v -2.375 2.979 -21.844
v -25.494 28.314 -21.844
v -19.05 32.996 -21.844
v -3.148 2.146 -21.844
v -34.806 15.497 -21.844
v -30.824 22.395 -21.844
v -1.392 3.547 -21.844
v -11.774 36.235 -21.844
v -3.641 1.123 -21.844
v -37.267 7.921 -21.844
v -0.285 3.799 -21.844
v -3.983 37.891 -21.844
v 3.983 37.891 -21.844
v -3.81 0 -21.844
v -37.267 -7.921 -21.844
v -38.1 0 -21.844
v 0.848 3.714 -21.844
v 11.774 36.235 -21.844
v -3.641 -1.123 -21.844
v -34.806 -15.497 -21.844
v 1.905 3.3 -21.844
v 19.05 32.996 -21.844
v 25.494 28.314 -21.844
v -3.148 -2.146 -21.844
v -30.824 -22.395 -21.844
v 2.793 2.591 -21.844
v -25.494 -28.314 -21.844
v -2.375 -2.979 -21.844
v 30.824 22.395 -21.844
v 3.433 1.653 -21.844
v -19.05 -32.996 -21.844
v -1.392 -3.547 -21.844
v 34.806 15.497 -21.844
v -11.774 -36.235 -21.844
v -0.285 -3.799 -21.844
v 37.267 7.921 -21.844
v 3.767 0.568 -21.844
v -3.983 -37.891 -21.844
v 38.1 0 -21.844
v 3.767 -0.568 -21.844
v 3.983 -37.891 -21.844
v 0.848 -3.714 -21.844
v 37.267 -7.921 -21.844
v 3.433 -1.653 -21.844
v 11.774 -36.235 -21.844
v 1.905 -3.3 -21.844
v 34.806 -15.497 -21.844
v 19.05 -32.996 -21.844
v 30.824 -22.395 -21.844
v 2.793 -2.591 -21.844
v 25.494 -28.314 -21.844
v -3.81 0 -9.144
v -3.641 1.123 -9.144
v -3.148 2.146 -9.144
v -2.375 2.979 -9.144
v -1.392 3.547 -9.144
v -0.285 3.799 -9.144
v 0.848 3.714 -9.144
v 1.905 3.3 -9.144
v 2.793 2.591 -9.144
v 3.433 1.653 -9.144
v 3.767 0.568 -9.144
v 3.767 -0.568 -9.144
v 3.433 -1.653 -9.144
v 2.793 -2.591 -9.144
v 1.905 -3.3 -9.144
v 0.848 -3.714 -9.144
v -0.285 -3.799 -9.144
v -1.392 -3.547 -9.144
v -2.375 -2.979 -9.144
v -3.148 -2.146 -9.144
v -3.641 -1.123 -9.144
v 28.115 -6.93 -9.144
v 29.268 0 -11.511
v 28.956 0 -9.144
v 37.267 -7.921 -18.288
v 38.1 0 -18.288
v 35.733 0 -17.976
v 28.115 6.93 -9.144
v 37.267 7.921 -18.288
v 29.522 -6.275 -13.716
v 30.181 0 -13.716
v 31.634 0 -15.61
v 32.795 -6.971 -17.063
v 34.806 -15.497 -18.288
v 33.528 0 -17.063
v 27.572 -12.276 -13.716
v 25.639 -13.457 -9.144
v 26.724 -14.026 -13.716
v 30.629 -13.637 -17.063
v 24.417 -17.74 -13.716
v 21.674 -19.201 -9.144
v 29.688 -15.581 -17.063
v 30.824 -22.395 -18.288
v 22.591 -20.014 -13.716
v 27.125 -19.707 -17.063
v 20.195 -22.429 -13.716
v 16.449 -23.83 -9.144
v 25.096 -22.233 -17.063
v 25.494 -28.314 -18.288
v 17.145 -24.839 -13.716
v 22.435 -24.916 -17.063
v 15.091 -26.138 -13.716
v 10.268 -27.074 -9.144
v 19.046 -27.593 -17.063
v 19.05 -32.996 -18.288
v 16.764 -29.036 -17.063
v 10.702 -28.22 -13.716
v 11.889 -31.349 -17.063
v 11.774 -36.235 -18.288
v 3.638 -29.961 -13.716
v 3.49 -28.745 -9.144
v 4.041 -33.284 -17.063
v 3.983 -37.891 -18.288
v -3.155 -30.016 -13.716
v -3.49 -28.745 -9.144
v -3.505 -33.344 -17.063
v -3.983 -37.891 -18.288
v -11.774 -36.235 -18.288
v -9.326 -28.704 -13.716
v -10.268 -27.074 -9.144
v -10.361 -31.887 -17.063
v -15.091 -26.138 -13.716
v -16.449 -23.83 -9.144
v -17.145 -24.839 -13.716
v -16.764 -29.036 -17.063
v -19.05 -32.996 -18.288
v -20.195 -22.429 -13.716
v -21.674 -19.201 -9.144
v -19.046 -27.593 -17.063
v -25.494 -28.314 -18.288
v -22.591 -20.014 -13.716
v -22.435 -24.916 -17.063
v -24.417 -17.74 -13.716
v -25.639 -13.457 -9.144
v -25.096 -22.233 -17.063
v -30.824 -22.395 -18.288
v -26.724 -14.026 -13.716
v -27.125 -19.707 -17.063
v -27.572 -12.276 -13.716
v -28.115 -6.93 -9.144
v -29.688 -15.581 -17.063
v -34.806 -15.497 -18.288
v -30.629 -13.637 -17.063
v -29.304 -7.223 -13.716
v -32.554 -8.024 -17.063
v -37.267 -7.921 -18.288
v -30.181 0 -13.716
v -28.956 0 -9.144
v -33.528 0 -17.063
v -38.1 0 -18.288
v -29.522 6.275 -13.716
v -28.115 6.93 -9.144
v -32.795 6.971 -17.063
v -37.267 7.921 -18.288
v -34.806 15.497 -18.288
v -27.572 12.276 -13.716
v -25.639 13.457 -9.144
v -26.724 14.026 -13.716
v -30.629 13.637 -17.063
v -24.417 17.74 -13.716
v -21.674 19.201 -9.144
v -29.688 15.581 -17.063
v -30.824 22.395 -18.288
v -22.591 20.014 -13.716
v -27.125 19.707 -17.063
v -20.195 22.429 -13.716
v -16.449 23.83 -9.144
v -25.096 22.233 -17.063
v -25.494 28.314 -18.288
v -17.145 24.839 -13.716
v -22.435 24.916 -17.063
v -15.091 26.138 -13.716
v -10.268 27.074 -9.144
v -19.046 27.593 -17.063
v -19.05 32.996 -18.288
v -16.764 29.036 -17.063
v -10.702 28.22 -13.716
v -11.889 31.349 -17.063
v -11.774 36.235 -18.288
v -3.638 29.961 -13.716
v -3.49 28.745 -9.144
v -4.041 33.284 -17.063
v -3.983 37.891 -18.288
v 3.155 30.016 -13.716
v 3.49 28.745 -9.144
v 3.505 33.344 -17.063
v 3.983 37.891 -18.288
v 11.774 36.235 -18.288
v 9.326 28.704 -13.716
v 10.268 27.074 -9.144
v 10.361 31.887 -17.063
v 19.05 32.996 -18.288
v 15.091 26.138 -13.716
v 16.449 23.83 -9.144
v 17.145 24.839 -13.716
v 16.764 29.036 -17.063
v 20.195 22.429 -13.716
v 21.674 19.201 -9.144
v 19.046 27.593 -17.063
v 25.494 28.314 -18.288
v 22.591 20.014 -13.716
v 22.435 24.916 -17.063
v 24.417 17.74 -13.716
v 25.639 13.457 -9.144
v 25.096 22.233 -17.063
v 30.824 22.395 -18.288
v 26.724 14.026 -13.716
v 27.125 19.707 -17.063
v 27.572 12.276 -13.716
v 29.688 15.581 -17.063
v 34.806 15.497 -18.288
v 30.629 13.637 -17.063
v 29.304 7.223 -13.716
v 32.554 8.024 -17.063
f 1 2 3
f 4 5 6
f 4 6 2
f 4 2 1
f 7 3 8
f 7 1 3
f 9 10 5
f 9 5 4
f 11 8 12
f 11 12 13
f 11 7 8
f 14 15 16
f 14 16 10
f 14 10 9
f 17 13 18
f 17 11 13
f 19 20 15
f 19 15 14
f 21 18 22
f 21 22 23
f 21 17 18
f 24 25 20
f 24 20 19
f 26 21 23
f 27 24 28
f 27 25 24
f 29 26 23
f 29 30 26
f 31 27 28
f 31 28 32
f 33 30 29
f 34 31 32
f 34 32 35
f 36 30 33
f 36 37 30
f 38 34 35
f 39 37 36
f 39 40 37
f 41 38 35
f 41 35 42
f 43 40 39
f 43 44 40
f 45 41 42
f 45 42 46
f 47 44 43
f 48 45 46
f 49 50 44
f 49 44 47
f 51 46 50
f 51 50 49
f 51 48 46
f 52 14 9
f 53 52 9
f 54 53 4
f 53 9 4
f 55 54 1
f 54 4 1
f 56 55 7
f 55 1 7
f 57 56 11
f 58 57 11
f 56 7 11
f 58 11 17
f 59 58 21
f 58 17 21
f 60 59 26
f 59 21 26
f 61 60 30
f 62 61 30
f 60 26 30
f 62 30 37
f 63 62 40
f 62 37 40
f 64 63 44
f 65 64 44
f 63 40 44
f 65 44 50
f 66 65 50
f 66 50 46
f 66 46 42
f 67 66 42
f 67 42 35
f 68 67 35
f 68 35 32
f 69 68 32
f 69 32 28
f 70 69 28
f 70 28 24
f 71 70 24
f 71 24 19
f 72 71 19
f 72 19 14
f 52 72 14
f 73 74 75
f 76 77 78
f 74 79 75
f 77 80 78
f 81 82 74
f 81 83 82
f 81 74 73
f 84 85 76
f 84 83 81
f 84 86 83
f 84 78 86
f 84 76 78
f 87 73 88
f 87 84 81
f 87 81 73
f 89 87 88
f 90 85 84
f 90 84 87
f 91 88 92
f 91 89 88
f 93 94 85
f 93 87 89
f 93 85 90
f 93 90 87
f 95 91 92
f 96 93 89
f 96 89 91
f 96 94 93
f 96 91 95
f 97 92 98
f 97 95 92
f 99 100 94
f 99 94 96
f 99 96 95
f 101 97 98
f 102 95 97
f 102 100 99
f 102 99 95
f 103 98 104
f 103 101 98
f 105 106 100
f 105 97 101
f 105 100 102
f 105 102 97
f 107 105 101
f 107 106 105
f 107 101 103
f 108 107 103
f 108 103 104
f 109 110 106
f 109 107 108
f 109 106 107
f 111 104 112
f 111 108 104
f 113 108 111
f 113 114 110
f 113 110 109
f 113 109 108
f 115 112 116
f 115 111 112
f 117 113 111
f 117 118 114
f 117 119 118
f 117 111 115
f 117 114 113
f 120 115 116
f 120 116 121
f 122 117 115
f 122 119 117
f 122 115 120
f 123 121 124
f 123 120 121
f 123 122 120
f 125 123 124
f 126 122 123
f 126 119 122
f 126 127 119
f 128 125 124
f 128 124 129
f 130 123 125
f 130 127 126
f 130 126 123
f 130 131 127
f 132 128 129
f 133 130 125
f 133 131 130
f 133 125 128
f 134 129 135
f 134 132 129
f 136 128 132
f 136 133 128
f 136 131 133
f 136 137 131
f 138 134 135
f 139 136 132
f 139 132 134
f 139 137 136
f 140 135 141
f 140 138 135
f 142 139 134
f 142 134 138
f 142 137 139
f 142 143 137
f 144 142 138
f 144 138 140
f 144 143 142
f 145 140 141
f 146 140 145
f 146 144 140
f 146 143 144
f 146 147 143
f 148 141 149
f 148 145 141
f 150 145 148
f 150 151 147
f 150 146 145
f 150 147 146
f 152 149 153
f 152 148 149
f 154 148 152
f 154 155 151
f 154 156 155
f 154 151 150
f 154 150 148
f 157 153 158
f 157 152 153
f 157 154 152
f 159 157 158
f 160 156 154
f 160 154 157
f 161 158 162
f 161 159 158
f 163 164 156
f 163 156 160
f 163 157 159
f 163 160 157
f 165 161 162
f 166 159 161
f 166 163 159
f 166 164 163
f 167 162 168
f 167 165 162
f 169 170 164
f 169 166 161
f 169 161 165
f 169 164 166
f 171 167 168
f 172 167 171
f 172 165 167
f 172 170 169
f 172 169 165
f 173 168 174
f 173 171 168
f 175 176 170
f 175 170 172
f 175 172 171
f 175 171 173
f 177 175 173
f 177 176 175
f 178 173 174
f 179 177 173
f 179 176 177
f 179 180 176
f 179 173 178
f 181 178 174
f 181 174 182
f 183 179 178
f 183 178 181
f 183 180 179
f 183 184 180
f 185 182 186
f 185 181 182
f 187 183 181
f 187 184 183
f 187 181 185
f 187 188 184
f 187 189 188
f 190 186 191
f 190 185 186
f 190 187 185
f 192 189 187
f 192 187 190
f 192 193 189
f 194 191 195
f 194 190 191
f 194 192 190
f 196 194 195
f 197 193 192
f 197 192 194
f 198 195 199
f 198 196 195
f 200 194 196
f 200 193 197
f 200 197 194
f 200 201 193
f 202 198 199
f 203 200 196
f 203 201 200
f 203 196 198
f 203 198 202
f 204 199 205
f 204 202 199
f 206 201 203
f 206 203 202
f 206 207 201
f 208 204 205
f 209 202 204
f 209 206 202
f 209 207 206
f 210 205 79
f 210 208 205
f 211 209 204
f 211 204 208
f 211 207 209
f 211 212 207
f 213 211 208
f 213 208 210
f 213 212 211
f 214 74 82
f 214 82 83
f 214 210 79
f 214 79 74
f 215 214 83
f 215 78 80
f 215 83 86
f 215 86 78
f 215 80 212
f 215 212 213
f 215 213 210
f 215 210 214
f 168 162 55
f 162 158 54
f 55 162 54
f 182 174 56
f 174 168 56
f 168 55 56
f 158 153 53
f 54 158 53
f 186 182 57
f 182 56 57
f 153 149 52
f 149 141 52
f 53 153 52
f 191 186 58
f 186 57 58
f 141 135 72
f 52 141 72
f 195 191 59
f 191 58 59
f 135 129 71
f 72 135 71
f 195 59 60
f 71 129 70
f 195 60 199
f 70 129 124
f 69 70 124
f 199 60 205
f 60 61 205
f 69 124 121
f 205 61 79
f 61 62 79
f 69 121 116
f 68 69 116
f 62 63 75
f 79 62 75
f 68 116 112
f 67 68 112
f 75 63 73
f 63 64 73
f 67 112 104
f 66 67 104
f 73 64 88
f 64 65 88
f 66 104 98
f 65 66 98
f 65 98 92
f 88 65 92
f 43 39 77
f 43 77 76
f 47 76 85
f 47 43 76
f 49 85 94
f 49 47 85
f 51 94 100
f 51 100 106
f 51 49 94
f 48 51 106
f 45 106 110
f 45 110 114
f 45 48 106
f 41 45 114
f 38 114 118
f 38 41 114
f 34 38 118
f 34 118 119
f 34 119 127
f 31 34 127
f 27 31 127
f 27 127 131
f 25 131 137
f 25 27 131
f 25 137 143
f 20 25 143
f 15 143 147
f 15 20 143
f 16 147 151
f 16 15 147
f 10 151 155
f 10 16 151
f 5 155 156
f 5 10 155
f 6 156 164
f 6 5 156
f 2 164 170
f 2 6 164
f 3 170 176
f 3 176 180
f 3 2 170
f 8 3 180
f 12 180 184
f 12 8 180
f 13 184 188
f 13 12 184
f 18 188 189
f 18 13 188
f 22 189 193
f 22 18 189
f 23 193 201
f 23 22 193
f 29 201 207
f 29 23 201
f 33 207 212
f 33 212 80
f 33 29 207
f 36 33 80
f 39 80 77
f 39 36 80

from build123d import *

# Parameters (mm, degrees)
SKETCH9_R                  = 38.1
BOSS_EXTRUDE2_DEPTH        = 3.556
BOSS_EXTRUDE3_START        = 3.556
SKETCH10_R                 = 38.1
BOSS_EXTRUDE3_DEPTH        = 3.556
F_3_4_0_3_DIAMETER_HOLE1_D = 7.62
CUT_EXTRUDE1_DEPTH         = 59.141038312
CUT_EXTRUDE1_DEPTH_BACK    = 59.141038312
SKETCH16_W                 = 76.2
SKETCH16_H                 = 12.7


with BuildPart() as part:
    # Sketch5 → Revolve1 (revolve)
    with BuildSketch(Plane(origin=(0, 0, 0), x_dir=(1, 0, 0), z_dir=(0, 1, 0)), mode=Mode.PRIVATE) as revolve1_sk:
        with BuildLine():
            Line((0, 0), (-38.1, 0))
            ThreePointArc((-38.1, 0), (-28.956, 9.144), (-38.1, 18.288))
            Line((-38.1, 18.288), (0, 18.288))
            Line((0, 18.288), (0, 0))
        make_face()
    revolve(revolve1_sk.sketch.rotate(Axis((0, 0, 0), (0, 0, -1)), 180), axis=Axis((0, 0, 0), (0, 0, -1)))

    # Sketch9 → Boss-Extrude2 (add)
    with BuildSketch(Plane.XY):
        Circle(SKETCH9_R)
    extrude(amount=BOSS_EXTRUDE2_DEPTH)

    # Sketch10 → Boss-Extrude3 (add)
    with BuildSketch(Plane(origin=(0, 0, -18.288), x_dir=(-1, 0, 0), z_dir=(0, 0, -1)).offset(BOSS_EXTRUDE3_START)):
        with Locations(Location((0, 0, 0), (0, 0, 180))):
            Circle(SKETCH10_R)
    extrude(amount=-BOSS_EXTRUDE3_DEPTH)

    # 3/4 (0.3) Diameter Hole1 (through all)
    with Locations(Plane.XY.offset(3.556)):
        with Locations((0, 0)):
            Hole(F_3_4_0_3_DIAMETER_HOLE1_D / 2)

    # Sketch16 → Cut-Extrude1 (cut, two sides: drawn at the far end of the back side and taken through both)
    with BuildSketch(Plane(origin=(0, 0, 0), x_dir=(1, 0, 0), z_dir=(0, 1, 0)).offset(-CUT_EXTRUDE1_DEPTH_BACK)):
        with Locations((0, 2.794)):
            Rectangle(SKETCH16_W, SKETCH16_H)
    extrude(amount=CUT_EXTRUDE1_DEPTH + CUT_EXTRUDE1_DEPTH_BACK, mode=Mode.SUBTRACT)


solid = part.part
